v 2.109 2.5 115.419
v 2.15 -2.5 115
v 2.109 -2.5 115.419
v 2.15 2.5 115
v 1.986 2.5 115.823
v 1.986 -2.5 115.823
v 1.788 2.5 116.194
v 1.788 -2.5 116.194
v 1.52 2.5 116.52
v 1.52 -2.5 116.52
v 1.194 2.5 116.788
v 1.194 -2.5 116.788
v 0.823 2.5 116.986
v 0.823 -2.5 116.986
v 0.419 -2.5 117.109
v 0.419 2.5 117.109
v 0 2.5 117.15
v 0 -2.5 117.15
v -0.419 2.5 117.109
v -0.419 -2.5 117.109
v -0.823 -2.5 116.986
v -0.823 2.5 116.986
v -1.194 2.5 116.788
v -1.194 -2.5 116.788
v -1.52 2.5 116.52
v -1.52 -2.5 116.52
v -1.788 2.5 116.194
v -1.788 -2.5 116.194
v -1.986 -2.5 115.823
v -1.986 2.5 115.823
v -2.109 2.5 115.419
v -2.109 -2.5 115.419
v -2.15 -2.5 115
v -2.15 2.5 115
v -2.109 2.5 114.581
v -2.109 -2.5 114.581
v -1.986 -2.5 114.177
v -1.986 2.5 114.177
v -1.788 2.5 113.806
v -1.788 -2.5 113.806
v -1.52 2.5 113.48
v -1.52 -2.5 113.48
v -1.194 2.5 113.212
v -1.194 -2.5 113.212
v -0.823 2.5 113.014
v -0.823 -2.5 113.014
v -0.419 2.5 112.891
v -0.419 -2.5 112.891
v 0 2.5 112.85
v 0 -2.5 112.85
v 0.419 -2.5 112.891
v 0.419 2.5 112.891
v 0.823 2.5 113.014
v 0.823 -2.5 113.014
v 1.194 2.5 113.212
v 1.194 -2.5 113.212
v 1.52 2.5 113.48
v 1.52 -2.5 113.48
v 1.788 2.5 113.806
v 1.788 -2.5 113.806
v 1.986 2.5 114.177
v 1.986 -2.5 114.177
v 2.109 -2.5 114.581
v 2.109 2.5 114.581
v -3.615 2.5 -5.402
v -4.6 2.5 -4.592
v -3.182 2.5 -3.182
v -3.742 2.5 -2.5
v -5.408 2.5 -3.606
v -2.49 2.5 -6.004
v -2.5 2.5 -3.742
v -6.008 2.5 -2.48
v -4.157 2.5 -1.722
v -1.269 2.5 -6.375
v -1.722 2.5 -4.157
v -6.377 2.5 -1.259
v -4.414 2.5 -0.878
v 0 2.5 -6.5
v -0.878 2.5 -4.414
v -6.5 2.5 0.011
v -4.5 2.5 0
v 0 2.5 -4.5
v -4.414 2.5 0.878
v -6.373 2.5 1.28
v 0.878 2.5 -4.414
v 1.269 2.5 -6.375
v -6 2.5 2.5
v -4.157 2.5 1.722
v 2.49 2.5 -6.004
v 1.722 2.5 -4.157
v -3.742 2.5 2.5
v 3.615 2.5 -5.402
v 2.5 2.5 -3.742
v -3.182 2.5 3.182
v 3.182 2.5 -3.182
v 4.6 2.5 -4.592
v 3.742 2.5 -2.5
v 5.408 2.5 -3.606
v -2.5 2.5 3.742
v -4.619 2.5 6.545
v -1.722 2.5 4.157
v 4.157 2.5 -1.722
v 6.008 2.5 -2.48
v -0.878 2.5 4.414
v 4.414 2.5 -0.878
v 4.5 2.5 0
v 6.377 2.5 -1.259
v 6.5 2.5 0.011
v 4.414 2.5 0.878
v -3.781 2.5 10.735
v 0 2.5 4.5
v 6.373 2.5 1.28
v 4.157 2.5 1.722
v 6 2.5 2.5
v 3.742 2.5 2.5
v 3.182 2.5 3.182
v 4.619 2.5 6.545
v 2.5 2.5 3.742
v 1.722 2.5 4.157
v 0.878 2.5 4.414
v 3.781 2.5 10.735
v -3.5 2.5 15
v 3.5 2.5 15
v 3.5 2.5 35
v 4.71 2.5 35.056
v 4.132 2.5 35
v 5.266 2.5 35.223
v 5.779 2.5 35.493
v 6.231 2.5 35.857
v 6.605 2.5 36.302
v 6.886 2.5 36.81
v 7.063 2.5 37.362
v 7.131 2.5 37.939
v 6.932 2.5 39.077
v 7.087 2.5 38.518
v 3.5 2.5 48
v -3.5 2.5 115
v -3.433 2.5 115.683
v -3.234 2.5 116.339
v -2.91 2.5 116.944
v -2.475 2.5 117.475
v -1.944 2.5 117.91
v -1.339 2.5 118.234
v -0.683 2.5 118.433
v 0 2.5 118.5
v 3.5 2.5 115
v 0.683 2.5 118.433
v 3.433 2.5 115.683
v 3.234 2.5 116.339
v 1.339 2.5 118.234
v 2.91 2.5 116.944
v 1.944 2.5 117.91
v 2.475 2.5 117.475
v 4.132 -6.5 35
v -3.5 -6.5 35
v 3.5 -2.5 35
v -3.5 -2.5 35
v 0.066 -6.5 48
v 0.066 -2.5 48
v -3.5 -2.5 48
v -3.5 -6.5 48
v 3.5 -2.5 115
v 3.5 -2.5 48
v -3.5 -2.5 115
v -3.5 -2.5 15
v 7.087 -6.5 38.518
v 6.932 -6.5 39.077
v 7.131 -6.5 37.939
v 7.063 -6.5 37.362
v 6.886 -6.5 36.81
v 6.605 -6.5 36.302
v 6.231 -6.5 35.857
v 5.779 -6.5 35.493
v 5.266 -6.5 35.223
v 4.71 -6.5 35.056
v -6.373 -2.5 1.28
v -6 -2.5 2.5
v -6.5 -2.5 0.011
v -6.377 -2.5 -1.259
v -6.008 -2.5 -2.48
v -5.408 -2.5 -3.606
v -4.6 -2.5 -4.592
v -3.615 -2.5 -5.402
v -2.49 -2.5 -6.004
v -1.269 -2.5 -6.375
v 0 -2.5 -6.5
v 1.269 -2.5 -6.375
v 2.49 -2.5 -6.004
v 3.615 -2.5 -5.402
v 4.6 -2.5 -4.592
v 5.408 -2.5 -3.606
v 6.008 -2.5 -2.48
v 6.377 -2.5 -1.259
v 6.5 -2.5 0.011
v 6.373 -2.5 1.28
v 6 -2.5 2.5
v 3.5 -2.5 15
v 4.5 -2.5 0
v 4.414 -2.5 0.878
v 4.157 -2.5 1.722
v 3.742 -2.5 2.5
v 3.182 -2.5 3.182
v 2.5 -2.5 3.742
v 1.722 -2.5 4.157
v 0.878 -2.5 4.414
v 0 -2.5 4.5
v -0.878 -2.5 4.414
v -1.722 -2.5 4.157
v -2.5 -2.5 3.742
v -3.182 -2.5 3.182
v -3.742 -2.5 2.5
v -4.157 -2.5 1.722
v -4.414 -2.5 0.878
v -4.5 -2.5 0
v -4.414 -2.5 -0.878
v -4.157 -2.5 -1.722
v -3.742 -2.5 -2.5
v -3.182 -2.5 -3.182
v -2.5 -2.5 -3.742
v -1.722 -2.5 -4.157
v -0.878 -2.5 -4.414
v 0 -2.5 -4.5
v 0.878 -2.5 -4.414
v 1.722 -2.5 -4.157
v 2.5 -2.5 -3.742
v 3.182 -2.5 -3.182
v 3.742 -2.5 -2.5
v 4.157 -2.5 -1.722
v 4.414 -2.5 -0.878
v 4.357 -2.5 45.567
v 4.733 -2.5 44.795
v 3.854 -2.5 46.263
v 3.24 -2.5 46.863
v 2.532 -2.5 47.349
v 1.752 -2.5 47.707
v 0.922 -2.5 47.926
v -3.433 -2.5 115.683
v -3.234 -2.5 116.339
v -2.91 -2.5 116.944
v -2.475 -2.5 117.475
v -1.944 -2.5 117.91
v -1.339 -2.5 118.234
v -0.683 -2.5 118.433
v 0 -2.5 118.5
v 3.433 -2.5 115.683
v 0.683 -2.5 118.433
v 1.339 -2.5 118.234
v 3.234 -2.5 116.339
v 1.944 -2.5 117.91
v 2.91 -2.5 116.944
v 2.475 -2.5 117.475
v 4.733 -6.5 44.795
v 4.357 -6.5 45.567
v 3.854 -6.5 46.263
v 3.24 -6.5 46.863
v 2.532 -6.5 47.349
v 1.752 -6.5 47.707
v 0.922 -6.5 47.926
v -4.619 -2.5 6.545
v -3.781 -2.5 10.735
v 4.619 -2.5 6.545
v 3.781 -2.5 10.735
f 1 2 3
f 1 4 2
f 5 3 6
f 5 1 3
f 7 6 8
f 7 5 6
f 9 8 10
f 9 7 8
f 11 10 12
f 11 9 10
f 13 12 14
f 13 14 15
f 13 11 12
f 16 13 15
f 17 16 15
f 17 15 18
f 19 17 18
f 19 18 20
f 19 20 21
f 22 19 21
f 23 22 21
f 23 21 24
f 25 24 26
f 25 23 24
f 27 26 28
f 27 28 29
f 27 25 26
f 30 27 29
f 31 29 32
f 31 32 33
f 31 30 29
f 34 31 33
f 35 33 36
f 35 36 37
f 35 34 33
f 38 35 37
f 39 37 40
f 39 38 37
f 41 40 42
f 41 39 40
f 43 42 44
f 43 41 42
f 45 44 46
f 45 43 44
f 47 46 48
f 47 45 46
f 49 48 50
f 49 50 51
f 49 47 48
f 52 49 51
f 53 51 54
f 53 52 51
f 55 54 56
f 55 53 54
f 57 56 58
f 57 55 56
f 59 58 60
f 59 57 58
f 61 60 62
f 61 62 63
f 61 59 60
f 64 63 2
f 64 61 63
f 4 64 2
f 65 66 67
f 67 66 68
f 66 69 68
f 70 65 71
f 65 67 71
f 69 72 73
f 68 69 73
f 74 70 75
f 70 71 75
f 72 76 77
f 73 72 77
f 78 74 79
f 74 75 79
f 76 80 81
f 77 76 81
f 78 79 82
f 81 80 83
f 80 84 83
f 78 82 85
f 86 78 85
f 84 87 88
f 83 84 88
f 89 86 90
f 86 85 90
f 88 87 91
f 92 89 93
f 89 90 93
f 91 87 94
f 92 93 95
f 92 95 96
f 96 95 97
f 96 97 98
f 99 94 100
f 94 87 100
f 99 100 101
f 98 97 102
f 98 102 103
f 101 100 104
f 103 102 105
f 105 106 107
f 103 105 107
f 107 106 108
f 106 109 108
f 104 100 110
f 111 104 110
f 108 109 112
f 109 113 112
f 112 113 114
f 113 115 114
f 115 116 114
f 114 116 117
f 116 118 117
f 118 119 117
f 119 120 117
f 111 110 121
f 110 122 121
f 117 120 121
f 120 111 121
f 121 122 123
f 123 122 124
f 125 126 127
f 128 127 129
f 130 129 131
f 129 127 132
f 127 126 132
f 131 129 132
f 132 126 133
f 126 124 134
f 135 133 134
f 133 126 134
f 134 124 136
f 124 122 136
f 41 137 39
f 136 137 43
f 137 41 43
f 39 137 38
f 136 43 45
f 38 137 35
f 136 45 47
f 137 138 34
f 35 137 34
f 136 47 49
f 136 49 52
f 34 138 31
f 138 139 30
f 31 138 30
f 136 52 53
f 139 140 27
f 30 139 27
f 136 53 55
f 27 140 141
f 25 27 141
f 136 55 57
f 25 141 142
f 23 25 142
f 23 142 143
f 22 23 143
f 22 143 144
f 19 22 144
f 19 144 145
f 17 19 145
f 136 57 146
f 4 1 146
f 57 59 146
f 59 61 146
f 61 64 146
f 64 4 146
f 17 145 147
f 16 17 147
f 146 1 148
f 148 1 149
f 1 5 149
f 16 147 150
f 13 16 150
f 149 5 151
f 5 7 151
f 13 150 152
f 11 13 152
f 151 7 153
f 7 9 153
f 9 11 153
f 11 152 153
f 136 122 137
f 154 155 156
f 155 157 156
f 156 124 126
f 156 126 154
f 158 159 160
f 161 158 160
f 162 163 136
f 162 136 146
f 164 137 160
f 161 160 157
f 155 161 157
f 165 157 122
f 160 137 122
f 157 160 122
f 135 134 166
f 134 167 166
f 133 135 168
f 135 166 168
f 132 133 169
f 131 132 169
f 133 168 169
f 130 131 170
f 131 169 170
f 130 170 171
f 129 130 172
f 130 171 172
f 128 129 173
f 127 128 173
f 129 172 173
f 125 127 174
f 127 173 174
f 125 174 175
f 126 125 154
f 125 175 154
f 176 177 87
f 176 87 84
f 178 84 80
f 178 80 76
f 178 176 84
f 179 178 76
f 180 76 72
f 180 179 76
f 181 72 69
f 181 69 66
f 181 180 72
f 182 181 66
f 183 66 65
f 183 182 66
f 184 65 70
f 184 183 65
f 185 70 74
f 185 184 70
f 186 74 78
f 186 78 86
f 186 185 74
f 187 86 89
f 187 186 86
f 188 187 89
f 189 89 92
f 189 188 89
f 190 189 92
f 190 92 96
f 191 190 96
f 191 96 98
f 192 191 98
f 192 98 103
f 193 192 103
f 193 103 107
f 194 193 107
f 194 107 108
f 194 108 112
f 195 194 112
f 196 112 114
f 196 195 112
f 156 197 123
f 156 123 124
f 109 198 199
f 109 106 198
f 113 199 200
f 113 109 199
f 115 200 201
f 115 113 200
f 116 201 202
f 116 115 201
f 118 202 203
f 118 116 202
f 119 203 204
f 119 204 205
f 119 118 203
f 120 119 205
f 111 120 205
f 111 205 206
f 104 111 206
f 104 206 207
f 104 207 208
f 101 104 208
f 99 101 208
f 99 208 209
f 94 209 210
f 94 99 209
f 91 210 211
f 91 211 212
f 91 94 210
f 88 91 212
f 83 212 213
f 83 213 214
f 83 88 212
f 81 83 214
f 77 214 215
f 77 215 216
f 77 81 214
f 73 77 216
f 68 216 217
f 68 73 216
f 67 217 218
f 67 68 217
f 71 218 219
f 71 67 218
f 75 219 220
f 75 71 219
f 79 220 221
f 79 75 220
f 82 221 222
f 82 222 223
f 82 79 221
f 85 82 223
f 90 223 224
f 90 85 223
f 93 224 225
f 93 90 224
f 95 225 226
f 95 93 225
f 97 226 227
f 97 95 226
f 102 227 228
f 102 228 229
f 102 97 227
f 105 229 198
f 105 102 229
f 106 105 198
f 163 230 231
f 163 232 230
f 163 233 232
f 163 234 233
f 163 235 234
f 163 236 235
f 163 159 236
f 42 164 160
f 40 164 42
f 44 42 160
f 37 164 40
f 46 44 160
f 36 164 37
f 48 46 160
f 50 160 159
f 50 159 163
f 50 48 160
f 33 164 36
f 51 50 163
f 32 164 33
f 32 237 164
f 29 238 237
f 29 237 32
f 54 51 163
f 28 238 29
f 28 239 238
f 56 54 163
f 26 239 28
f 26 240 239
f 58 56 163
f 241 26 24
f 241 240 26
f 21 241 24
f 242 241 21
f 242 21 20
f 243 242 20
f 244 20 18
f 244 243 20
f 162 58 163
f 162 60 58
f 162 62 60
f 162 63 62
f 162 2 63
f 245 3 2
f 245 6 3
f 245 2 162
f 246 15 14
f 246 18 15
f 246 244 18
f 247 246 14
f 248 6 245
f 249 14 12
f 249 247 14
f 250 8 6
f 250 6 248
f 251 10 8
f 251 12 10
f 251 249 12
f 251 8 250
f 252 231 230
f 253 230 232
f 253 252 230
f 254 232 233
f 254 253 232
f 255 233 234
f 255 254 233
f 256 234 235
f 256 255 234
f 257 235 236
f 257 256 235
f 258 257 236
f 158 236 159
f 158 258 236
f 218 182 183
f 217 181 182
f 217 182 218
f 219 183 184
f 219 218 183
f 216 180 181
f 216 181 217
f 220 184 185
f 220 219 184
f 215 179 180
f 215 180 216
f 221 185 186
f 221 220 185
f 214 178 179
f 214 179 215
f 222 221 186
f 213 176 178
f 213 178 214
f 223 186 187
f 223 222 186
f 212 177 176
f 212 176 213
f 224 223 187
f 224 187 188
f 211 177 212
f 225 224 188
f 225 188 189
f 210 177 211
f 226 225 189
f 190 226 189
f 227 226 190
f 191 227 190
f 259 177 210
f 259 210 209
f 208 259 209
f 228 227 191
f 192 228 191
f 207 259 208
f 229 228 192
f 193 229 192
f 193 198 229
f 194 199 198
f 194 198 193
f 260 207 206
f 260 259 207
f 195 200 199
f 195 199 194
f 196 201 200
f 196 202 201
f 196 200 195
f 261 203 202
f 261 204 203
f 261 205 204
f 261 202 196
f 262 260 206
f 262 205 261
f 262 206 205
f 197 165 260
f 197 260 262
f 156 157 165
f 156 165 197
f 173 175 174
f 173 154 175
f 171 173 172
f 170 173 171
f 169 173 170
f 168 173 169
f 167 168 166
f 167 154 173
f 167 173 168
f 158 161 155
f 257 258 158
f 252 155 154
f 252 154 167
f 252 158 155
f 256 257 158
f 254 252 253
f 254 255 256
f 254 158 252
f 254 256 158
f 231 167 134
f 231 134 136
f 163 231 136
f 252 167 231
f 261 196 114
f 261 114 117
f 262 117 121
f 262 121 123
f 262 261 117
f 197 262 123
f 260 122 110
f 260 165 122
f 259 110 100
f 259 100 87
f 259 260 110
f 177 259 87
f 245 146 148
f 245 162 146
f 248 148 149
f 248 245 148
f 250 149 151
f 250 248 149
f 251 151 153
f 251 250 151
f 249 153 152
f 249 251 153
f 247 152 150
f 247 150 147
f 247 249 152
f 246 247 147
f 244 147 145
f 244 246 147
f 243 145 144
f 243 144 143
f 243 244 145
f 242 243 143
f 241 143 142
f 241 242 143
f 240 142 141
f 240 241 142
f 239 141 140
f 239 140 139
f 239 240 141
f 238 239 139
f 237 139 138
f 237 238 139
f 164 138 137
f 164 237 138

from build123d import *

# Parameters (mm, degrees)
F0_R          = 4.5
F0_R_2        = 2.15
F1_DEPTH      = 2.5
F3_DEPTH      = 4
F3_DEPTH_BACK = 5
F4_R          = 5
F5_R          = 3


with BuildPart() as f1:
    # F0 (on Front) → F1 (new body, symmetric)
    with BuildSketch(Plane.XZ):
        with BuildLine():
            ThreePointArc((-3.5, 15), (-4.13112804, 8.626225608), (-6, 2.5))
            ThreePointArc((-6, 2.5), (0, -6.5), (6, 2.5))
            ThreePointArc((6, 2.5), (4.13112804, 8.626225608), (3.5, 15))
            Line((3.5, 15), (3.5, 115))
            ThreePointArc((3.5, 115), (0, 118.5), (-3.5, 115))
            Line((-3.5, 115), (-3.5, 15))
        make_face()
        Circle(F0_R, mode=Mode.SUBTRACT)
        with Locations((0, 115)):
            Circle(F0_R_2, mode=Mode.SUBTRACT)
    extrude(amount=F1_DEPTH, both=True)

    # F2 (on face) → F3 (join, two sides)
    with BuildSketch(Plane.XZ.offset(2.5)) as f3_sk:
        Polygon((3.5, 48), (-3.5, 48), (-3.5, 35), (3.5, 35), (8.5, 35), align=None)
    extrude(amount=F3_DEPTH)
    extrude(f3_sk.sketch, amount=-F3_DEPTH_BACK)

    # F4
    f4_edges = [f1.edges().sort_by_distance(p)[0] for p in [
        (3.5, -4.5, 48),
    ]]
    fillet(f4_edges, radius=F4_R)

    # F5
    f5_edges = [f1.edges().sort_by_distance(p)[0] for p in [
        (8.5, -2, 35),
    ]]
    fillet(f5_edges, radius=F5_R)


solid = f1.part
